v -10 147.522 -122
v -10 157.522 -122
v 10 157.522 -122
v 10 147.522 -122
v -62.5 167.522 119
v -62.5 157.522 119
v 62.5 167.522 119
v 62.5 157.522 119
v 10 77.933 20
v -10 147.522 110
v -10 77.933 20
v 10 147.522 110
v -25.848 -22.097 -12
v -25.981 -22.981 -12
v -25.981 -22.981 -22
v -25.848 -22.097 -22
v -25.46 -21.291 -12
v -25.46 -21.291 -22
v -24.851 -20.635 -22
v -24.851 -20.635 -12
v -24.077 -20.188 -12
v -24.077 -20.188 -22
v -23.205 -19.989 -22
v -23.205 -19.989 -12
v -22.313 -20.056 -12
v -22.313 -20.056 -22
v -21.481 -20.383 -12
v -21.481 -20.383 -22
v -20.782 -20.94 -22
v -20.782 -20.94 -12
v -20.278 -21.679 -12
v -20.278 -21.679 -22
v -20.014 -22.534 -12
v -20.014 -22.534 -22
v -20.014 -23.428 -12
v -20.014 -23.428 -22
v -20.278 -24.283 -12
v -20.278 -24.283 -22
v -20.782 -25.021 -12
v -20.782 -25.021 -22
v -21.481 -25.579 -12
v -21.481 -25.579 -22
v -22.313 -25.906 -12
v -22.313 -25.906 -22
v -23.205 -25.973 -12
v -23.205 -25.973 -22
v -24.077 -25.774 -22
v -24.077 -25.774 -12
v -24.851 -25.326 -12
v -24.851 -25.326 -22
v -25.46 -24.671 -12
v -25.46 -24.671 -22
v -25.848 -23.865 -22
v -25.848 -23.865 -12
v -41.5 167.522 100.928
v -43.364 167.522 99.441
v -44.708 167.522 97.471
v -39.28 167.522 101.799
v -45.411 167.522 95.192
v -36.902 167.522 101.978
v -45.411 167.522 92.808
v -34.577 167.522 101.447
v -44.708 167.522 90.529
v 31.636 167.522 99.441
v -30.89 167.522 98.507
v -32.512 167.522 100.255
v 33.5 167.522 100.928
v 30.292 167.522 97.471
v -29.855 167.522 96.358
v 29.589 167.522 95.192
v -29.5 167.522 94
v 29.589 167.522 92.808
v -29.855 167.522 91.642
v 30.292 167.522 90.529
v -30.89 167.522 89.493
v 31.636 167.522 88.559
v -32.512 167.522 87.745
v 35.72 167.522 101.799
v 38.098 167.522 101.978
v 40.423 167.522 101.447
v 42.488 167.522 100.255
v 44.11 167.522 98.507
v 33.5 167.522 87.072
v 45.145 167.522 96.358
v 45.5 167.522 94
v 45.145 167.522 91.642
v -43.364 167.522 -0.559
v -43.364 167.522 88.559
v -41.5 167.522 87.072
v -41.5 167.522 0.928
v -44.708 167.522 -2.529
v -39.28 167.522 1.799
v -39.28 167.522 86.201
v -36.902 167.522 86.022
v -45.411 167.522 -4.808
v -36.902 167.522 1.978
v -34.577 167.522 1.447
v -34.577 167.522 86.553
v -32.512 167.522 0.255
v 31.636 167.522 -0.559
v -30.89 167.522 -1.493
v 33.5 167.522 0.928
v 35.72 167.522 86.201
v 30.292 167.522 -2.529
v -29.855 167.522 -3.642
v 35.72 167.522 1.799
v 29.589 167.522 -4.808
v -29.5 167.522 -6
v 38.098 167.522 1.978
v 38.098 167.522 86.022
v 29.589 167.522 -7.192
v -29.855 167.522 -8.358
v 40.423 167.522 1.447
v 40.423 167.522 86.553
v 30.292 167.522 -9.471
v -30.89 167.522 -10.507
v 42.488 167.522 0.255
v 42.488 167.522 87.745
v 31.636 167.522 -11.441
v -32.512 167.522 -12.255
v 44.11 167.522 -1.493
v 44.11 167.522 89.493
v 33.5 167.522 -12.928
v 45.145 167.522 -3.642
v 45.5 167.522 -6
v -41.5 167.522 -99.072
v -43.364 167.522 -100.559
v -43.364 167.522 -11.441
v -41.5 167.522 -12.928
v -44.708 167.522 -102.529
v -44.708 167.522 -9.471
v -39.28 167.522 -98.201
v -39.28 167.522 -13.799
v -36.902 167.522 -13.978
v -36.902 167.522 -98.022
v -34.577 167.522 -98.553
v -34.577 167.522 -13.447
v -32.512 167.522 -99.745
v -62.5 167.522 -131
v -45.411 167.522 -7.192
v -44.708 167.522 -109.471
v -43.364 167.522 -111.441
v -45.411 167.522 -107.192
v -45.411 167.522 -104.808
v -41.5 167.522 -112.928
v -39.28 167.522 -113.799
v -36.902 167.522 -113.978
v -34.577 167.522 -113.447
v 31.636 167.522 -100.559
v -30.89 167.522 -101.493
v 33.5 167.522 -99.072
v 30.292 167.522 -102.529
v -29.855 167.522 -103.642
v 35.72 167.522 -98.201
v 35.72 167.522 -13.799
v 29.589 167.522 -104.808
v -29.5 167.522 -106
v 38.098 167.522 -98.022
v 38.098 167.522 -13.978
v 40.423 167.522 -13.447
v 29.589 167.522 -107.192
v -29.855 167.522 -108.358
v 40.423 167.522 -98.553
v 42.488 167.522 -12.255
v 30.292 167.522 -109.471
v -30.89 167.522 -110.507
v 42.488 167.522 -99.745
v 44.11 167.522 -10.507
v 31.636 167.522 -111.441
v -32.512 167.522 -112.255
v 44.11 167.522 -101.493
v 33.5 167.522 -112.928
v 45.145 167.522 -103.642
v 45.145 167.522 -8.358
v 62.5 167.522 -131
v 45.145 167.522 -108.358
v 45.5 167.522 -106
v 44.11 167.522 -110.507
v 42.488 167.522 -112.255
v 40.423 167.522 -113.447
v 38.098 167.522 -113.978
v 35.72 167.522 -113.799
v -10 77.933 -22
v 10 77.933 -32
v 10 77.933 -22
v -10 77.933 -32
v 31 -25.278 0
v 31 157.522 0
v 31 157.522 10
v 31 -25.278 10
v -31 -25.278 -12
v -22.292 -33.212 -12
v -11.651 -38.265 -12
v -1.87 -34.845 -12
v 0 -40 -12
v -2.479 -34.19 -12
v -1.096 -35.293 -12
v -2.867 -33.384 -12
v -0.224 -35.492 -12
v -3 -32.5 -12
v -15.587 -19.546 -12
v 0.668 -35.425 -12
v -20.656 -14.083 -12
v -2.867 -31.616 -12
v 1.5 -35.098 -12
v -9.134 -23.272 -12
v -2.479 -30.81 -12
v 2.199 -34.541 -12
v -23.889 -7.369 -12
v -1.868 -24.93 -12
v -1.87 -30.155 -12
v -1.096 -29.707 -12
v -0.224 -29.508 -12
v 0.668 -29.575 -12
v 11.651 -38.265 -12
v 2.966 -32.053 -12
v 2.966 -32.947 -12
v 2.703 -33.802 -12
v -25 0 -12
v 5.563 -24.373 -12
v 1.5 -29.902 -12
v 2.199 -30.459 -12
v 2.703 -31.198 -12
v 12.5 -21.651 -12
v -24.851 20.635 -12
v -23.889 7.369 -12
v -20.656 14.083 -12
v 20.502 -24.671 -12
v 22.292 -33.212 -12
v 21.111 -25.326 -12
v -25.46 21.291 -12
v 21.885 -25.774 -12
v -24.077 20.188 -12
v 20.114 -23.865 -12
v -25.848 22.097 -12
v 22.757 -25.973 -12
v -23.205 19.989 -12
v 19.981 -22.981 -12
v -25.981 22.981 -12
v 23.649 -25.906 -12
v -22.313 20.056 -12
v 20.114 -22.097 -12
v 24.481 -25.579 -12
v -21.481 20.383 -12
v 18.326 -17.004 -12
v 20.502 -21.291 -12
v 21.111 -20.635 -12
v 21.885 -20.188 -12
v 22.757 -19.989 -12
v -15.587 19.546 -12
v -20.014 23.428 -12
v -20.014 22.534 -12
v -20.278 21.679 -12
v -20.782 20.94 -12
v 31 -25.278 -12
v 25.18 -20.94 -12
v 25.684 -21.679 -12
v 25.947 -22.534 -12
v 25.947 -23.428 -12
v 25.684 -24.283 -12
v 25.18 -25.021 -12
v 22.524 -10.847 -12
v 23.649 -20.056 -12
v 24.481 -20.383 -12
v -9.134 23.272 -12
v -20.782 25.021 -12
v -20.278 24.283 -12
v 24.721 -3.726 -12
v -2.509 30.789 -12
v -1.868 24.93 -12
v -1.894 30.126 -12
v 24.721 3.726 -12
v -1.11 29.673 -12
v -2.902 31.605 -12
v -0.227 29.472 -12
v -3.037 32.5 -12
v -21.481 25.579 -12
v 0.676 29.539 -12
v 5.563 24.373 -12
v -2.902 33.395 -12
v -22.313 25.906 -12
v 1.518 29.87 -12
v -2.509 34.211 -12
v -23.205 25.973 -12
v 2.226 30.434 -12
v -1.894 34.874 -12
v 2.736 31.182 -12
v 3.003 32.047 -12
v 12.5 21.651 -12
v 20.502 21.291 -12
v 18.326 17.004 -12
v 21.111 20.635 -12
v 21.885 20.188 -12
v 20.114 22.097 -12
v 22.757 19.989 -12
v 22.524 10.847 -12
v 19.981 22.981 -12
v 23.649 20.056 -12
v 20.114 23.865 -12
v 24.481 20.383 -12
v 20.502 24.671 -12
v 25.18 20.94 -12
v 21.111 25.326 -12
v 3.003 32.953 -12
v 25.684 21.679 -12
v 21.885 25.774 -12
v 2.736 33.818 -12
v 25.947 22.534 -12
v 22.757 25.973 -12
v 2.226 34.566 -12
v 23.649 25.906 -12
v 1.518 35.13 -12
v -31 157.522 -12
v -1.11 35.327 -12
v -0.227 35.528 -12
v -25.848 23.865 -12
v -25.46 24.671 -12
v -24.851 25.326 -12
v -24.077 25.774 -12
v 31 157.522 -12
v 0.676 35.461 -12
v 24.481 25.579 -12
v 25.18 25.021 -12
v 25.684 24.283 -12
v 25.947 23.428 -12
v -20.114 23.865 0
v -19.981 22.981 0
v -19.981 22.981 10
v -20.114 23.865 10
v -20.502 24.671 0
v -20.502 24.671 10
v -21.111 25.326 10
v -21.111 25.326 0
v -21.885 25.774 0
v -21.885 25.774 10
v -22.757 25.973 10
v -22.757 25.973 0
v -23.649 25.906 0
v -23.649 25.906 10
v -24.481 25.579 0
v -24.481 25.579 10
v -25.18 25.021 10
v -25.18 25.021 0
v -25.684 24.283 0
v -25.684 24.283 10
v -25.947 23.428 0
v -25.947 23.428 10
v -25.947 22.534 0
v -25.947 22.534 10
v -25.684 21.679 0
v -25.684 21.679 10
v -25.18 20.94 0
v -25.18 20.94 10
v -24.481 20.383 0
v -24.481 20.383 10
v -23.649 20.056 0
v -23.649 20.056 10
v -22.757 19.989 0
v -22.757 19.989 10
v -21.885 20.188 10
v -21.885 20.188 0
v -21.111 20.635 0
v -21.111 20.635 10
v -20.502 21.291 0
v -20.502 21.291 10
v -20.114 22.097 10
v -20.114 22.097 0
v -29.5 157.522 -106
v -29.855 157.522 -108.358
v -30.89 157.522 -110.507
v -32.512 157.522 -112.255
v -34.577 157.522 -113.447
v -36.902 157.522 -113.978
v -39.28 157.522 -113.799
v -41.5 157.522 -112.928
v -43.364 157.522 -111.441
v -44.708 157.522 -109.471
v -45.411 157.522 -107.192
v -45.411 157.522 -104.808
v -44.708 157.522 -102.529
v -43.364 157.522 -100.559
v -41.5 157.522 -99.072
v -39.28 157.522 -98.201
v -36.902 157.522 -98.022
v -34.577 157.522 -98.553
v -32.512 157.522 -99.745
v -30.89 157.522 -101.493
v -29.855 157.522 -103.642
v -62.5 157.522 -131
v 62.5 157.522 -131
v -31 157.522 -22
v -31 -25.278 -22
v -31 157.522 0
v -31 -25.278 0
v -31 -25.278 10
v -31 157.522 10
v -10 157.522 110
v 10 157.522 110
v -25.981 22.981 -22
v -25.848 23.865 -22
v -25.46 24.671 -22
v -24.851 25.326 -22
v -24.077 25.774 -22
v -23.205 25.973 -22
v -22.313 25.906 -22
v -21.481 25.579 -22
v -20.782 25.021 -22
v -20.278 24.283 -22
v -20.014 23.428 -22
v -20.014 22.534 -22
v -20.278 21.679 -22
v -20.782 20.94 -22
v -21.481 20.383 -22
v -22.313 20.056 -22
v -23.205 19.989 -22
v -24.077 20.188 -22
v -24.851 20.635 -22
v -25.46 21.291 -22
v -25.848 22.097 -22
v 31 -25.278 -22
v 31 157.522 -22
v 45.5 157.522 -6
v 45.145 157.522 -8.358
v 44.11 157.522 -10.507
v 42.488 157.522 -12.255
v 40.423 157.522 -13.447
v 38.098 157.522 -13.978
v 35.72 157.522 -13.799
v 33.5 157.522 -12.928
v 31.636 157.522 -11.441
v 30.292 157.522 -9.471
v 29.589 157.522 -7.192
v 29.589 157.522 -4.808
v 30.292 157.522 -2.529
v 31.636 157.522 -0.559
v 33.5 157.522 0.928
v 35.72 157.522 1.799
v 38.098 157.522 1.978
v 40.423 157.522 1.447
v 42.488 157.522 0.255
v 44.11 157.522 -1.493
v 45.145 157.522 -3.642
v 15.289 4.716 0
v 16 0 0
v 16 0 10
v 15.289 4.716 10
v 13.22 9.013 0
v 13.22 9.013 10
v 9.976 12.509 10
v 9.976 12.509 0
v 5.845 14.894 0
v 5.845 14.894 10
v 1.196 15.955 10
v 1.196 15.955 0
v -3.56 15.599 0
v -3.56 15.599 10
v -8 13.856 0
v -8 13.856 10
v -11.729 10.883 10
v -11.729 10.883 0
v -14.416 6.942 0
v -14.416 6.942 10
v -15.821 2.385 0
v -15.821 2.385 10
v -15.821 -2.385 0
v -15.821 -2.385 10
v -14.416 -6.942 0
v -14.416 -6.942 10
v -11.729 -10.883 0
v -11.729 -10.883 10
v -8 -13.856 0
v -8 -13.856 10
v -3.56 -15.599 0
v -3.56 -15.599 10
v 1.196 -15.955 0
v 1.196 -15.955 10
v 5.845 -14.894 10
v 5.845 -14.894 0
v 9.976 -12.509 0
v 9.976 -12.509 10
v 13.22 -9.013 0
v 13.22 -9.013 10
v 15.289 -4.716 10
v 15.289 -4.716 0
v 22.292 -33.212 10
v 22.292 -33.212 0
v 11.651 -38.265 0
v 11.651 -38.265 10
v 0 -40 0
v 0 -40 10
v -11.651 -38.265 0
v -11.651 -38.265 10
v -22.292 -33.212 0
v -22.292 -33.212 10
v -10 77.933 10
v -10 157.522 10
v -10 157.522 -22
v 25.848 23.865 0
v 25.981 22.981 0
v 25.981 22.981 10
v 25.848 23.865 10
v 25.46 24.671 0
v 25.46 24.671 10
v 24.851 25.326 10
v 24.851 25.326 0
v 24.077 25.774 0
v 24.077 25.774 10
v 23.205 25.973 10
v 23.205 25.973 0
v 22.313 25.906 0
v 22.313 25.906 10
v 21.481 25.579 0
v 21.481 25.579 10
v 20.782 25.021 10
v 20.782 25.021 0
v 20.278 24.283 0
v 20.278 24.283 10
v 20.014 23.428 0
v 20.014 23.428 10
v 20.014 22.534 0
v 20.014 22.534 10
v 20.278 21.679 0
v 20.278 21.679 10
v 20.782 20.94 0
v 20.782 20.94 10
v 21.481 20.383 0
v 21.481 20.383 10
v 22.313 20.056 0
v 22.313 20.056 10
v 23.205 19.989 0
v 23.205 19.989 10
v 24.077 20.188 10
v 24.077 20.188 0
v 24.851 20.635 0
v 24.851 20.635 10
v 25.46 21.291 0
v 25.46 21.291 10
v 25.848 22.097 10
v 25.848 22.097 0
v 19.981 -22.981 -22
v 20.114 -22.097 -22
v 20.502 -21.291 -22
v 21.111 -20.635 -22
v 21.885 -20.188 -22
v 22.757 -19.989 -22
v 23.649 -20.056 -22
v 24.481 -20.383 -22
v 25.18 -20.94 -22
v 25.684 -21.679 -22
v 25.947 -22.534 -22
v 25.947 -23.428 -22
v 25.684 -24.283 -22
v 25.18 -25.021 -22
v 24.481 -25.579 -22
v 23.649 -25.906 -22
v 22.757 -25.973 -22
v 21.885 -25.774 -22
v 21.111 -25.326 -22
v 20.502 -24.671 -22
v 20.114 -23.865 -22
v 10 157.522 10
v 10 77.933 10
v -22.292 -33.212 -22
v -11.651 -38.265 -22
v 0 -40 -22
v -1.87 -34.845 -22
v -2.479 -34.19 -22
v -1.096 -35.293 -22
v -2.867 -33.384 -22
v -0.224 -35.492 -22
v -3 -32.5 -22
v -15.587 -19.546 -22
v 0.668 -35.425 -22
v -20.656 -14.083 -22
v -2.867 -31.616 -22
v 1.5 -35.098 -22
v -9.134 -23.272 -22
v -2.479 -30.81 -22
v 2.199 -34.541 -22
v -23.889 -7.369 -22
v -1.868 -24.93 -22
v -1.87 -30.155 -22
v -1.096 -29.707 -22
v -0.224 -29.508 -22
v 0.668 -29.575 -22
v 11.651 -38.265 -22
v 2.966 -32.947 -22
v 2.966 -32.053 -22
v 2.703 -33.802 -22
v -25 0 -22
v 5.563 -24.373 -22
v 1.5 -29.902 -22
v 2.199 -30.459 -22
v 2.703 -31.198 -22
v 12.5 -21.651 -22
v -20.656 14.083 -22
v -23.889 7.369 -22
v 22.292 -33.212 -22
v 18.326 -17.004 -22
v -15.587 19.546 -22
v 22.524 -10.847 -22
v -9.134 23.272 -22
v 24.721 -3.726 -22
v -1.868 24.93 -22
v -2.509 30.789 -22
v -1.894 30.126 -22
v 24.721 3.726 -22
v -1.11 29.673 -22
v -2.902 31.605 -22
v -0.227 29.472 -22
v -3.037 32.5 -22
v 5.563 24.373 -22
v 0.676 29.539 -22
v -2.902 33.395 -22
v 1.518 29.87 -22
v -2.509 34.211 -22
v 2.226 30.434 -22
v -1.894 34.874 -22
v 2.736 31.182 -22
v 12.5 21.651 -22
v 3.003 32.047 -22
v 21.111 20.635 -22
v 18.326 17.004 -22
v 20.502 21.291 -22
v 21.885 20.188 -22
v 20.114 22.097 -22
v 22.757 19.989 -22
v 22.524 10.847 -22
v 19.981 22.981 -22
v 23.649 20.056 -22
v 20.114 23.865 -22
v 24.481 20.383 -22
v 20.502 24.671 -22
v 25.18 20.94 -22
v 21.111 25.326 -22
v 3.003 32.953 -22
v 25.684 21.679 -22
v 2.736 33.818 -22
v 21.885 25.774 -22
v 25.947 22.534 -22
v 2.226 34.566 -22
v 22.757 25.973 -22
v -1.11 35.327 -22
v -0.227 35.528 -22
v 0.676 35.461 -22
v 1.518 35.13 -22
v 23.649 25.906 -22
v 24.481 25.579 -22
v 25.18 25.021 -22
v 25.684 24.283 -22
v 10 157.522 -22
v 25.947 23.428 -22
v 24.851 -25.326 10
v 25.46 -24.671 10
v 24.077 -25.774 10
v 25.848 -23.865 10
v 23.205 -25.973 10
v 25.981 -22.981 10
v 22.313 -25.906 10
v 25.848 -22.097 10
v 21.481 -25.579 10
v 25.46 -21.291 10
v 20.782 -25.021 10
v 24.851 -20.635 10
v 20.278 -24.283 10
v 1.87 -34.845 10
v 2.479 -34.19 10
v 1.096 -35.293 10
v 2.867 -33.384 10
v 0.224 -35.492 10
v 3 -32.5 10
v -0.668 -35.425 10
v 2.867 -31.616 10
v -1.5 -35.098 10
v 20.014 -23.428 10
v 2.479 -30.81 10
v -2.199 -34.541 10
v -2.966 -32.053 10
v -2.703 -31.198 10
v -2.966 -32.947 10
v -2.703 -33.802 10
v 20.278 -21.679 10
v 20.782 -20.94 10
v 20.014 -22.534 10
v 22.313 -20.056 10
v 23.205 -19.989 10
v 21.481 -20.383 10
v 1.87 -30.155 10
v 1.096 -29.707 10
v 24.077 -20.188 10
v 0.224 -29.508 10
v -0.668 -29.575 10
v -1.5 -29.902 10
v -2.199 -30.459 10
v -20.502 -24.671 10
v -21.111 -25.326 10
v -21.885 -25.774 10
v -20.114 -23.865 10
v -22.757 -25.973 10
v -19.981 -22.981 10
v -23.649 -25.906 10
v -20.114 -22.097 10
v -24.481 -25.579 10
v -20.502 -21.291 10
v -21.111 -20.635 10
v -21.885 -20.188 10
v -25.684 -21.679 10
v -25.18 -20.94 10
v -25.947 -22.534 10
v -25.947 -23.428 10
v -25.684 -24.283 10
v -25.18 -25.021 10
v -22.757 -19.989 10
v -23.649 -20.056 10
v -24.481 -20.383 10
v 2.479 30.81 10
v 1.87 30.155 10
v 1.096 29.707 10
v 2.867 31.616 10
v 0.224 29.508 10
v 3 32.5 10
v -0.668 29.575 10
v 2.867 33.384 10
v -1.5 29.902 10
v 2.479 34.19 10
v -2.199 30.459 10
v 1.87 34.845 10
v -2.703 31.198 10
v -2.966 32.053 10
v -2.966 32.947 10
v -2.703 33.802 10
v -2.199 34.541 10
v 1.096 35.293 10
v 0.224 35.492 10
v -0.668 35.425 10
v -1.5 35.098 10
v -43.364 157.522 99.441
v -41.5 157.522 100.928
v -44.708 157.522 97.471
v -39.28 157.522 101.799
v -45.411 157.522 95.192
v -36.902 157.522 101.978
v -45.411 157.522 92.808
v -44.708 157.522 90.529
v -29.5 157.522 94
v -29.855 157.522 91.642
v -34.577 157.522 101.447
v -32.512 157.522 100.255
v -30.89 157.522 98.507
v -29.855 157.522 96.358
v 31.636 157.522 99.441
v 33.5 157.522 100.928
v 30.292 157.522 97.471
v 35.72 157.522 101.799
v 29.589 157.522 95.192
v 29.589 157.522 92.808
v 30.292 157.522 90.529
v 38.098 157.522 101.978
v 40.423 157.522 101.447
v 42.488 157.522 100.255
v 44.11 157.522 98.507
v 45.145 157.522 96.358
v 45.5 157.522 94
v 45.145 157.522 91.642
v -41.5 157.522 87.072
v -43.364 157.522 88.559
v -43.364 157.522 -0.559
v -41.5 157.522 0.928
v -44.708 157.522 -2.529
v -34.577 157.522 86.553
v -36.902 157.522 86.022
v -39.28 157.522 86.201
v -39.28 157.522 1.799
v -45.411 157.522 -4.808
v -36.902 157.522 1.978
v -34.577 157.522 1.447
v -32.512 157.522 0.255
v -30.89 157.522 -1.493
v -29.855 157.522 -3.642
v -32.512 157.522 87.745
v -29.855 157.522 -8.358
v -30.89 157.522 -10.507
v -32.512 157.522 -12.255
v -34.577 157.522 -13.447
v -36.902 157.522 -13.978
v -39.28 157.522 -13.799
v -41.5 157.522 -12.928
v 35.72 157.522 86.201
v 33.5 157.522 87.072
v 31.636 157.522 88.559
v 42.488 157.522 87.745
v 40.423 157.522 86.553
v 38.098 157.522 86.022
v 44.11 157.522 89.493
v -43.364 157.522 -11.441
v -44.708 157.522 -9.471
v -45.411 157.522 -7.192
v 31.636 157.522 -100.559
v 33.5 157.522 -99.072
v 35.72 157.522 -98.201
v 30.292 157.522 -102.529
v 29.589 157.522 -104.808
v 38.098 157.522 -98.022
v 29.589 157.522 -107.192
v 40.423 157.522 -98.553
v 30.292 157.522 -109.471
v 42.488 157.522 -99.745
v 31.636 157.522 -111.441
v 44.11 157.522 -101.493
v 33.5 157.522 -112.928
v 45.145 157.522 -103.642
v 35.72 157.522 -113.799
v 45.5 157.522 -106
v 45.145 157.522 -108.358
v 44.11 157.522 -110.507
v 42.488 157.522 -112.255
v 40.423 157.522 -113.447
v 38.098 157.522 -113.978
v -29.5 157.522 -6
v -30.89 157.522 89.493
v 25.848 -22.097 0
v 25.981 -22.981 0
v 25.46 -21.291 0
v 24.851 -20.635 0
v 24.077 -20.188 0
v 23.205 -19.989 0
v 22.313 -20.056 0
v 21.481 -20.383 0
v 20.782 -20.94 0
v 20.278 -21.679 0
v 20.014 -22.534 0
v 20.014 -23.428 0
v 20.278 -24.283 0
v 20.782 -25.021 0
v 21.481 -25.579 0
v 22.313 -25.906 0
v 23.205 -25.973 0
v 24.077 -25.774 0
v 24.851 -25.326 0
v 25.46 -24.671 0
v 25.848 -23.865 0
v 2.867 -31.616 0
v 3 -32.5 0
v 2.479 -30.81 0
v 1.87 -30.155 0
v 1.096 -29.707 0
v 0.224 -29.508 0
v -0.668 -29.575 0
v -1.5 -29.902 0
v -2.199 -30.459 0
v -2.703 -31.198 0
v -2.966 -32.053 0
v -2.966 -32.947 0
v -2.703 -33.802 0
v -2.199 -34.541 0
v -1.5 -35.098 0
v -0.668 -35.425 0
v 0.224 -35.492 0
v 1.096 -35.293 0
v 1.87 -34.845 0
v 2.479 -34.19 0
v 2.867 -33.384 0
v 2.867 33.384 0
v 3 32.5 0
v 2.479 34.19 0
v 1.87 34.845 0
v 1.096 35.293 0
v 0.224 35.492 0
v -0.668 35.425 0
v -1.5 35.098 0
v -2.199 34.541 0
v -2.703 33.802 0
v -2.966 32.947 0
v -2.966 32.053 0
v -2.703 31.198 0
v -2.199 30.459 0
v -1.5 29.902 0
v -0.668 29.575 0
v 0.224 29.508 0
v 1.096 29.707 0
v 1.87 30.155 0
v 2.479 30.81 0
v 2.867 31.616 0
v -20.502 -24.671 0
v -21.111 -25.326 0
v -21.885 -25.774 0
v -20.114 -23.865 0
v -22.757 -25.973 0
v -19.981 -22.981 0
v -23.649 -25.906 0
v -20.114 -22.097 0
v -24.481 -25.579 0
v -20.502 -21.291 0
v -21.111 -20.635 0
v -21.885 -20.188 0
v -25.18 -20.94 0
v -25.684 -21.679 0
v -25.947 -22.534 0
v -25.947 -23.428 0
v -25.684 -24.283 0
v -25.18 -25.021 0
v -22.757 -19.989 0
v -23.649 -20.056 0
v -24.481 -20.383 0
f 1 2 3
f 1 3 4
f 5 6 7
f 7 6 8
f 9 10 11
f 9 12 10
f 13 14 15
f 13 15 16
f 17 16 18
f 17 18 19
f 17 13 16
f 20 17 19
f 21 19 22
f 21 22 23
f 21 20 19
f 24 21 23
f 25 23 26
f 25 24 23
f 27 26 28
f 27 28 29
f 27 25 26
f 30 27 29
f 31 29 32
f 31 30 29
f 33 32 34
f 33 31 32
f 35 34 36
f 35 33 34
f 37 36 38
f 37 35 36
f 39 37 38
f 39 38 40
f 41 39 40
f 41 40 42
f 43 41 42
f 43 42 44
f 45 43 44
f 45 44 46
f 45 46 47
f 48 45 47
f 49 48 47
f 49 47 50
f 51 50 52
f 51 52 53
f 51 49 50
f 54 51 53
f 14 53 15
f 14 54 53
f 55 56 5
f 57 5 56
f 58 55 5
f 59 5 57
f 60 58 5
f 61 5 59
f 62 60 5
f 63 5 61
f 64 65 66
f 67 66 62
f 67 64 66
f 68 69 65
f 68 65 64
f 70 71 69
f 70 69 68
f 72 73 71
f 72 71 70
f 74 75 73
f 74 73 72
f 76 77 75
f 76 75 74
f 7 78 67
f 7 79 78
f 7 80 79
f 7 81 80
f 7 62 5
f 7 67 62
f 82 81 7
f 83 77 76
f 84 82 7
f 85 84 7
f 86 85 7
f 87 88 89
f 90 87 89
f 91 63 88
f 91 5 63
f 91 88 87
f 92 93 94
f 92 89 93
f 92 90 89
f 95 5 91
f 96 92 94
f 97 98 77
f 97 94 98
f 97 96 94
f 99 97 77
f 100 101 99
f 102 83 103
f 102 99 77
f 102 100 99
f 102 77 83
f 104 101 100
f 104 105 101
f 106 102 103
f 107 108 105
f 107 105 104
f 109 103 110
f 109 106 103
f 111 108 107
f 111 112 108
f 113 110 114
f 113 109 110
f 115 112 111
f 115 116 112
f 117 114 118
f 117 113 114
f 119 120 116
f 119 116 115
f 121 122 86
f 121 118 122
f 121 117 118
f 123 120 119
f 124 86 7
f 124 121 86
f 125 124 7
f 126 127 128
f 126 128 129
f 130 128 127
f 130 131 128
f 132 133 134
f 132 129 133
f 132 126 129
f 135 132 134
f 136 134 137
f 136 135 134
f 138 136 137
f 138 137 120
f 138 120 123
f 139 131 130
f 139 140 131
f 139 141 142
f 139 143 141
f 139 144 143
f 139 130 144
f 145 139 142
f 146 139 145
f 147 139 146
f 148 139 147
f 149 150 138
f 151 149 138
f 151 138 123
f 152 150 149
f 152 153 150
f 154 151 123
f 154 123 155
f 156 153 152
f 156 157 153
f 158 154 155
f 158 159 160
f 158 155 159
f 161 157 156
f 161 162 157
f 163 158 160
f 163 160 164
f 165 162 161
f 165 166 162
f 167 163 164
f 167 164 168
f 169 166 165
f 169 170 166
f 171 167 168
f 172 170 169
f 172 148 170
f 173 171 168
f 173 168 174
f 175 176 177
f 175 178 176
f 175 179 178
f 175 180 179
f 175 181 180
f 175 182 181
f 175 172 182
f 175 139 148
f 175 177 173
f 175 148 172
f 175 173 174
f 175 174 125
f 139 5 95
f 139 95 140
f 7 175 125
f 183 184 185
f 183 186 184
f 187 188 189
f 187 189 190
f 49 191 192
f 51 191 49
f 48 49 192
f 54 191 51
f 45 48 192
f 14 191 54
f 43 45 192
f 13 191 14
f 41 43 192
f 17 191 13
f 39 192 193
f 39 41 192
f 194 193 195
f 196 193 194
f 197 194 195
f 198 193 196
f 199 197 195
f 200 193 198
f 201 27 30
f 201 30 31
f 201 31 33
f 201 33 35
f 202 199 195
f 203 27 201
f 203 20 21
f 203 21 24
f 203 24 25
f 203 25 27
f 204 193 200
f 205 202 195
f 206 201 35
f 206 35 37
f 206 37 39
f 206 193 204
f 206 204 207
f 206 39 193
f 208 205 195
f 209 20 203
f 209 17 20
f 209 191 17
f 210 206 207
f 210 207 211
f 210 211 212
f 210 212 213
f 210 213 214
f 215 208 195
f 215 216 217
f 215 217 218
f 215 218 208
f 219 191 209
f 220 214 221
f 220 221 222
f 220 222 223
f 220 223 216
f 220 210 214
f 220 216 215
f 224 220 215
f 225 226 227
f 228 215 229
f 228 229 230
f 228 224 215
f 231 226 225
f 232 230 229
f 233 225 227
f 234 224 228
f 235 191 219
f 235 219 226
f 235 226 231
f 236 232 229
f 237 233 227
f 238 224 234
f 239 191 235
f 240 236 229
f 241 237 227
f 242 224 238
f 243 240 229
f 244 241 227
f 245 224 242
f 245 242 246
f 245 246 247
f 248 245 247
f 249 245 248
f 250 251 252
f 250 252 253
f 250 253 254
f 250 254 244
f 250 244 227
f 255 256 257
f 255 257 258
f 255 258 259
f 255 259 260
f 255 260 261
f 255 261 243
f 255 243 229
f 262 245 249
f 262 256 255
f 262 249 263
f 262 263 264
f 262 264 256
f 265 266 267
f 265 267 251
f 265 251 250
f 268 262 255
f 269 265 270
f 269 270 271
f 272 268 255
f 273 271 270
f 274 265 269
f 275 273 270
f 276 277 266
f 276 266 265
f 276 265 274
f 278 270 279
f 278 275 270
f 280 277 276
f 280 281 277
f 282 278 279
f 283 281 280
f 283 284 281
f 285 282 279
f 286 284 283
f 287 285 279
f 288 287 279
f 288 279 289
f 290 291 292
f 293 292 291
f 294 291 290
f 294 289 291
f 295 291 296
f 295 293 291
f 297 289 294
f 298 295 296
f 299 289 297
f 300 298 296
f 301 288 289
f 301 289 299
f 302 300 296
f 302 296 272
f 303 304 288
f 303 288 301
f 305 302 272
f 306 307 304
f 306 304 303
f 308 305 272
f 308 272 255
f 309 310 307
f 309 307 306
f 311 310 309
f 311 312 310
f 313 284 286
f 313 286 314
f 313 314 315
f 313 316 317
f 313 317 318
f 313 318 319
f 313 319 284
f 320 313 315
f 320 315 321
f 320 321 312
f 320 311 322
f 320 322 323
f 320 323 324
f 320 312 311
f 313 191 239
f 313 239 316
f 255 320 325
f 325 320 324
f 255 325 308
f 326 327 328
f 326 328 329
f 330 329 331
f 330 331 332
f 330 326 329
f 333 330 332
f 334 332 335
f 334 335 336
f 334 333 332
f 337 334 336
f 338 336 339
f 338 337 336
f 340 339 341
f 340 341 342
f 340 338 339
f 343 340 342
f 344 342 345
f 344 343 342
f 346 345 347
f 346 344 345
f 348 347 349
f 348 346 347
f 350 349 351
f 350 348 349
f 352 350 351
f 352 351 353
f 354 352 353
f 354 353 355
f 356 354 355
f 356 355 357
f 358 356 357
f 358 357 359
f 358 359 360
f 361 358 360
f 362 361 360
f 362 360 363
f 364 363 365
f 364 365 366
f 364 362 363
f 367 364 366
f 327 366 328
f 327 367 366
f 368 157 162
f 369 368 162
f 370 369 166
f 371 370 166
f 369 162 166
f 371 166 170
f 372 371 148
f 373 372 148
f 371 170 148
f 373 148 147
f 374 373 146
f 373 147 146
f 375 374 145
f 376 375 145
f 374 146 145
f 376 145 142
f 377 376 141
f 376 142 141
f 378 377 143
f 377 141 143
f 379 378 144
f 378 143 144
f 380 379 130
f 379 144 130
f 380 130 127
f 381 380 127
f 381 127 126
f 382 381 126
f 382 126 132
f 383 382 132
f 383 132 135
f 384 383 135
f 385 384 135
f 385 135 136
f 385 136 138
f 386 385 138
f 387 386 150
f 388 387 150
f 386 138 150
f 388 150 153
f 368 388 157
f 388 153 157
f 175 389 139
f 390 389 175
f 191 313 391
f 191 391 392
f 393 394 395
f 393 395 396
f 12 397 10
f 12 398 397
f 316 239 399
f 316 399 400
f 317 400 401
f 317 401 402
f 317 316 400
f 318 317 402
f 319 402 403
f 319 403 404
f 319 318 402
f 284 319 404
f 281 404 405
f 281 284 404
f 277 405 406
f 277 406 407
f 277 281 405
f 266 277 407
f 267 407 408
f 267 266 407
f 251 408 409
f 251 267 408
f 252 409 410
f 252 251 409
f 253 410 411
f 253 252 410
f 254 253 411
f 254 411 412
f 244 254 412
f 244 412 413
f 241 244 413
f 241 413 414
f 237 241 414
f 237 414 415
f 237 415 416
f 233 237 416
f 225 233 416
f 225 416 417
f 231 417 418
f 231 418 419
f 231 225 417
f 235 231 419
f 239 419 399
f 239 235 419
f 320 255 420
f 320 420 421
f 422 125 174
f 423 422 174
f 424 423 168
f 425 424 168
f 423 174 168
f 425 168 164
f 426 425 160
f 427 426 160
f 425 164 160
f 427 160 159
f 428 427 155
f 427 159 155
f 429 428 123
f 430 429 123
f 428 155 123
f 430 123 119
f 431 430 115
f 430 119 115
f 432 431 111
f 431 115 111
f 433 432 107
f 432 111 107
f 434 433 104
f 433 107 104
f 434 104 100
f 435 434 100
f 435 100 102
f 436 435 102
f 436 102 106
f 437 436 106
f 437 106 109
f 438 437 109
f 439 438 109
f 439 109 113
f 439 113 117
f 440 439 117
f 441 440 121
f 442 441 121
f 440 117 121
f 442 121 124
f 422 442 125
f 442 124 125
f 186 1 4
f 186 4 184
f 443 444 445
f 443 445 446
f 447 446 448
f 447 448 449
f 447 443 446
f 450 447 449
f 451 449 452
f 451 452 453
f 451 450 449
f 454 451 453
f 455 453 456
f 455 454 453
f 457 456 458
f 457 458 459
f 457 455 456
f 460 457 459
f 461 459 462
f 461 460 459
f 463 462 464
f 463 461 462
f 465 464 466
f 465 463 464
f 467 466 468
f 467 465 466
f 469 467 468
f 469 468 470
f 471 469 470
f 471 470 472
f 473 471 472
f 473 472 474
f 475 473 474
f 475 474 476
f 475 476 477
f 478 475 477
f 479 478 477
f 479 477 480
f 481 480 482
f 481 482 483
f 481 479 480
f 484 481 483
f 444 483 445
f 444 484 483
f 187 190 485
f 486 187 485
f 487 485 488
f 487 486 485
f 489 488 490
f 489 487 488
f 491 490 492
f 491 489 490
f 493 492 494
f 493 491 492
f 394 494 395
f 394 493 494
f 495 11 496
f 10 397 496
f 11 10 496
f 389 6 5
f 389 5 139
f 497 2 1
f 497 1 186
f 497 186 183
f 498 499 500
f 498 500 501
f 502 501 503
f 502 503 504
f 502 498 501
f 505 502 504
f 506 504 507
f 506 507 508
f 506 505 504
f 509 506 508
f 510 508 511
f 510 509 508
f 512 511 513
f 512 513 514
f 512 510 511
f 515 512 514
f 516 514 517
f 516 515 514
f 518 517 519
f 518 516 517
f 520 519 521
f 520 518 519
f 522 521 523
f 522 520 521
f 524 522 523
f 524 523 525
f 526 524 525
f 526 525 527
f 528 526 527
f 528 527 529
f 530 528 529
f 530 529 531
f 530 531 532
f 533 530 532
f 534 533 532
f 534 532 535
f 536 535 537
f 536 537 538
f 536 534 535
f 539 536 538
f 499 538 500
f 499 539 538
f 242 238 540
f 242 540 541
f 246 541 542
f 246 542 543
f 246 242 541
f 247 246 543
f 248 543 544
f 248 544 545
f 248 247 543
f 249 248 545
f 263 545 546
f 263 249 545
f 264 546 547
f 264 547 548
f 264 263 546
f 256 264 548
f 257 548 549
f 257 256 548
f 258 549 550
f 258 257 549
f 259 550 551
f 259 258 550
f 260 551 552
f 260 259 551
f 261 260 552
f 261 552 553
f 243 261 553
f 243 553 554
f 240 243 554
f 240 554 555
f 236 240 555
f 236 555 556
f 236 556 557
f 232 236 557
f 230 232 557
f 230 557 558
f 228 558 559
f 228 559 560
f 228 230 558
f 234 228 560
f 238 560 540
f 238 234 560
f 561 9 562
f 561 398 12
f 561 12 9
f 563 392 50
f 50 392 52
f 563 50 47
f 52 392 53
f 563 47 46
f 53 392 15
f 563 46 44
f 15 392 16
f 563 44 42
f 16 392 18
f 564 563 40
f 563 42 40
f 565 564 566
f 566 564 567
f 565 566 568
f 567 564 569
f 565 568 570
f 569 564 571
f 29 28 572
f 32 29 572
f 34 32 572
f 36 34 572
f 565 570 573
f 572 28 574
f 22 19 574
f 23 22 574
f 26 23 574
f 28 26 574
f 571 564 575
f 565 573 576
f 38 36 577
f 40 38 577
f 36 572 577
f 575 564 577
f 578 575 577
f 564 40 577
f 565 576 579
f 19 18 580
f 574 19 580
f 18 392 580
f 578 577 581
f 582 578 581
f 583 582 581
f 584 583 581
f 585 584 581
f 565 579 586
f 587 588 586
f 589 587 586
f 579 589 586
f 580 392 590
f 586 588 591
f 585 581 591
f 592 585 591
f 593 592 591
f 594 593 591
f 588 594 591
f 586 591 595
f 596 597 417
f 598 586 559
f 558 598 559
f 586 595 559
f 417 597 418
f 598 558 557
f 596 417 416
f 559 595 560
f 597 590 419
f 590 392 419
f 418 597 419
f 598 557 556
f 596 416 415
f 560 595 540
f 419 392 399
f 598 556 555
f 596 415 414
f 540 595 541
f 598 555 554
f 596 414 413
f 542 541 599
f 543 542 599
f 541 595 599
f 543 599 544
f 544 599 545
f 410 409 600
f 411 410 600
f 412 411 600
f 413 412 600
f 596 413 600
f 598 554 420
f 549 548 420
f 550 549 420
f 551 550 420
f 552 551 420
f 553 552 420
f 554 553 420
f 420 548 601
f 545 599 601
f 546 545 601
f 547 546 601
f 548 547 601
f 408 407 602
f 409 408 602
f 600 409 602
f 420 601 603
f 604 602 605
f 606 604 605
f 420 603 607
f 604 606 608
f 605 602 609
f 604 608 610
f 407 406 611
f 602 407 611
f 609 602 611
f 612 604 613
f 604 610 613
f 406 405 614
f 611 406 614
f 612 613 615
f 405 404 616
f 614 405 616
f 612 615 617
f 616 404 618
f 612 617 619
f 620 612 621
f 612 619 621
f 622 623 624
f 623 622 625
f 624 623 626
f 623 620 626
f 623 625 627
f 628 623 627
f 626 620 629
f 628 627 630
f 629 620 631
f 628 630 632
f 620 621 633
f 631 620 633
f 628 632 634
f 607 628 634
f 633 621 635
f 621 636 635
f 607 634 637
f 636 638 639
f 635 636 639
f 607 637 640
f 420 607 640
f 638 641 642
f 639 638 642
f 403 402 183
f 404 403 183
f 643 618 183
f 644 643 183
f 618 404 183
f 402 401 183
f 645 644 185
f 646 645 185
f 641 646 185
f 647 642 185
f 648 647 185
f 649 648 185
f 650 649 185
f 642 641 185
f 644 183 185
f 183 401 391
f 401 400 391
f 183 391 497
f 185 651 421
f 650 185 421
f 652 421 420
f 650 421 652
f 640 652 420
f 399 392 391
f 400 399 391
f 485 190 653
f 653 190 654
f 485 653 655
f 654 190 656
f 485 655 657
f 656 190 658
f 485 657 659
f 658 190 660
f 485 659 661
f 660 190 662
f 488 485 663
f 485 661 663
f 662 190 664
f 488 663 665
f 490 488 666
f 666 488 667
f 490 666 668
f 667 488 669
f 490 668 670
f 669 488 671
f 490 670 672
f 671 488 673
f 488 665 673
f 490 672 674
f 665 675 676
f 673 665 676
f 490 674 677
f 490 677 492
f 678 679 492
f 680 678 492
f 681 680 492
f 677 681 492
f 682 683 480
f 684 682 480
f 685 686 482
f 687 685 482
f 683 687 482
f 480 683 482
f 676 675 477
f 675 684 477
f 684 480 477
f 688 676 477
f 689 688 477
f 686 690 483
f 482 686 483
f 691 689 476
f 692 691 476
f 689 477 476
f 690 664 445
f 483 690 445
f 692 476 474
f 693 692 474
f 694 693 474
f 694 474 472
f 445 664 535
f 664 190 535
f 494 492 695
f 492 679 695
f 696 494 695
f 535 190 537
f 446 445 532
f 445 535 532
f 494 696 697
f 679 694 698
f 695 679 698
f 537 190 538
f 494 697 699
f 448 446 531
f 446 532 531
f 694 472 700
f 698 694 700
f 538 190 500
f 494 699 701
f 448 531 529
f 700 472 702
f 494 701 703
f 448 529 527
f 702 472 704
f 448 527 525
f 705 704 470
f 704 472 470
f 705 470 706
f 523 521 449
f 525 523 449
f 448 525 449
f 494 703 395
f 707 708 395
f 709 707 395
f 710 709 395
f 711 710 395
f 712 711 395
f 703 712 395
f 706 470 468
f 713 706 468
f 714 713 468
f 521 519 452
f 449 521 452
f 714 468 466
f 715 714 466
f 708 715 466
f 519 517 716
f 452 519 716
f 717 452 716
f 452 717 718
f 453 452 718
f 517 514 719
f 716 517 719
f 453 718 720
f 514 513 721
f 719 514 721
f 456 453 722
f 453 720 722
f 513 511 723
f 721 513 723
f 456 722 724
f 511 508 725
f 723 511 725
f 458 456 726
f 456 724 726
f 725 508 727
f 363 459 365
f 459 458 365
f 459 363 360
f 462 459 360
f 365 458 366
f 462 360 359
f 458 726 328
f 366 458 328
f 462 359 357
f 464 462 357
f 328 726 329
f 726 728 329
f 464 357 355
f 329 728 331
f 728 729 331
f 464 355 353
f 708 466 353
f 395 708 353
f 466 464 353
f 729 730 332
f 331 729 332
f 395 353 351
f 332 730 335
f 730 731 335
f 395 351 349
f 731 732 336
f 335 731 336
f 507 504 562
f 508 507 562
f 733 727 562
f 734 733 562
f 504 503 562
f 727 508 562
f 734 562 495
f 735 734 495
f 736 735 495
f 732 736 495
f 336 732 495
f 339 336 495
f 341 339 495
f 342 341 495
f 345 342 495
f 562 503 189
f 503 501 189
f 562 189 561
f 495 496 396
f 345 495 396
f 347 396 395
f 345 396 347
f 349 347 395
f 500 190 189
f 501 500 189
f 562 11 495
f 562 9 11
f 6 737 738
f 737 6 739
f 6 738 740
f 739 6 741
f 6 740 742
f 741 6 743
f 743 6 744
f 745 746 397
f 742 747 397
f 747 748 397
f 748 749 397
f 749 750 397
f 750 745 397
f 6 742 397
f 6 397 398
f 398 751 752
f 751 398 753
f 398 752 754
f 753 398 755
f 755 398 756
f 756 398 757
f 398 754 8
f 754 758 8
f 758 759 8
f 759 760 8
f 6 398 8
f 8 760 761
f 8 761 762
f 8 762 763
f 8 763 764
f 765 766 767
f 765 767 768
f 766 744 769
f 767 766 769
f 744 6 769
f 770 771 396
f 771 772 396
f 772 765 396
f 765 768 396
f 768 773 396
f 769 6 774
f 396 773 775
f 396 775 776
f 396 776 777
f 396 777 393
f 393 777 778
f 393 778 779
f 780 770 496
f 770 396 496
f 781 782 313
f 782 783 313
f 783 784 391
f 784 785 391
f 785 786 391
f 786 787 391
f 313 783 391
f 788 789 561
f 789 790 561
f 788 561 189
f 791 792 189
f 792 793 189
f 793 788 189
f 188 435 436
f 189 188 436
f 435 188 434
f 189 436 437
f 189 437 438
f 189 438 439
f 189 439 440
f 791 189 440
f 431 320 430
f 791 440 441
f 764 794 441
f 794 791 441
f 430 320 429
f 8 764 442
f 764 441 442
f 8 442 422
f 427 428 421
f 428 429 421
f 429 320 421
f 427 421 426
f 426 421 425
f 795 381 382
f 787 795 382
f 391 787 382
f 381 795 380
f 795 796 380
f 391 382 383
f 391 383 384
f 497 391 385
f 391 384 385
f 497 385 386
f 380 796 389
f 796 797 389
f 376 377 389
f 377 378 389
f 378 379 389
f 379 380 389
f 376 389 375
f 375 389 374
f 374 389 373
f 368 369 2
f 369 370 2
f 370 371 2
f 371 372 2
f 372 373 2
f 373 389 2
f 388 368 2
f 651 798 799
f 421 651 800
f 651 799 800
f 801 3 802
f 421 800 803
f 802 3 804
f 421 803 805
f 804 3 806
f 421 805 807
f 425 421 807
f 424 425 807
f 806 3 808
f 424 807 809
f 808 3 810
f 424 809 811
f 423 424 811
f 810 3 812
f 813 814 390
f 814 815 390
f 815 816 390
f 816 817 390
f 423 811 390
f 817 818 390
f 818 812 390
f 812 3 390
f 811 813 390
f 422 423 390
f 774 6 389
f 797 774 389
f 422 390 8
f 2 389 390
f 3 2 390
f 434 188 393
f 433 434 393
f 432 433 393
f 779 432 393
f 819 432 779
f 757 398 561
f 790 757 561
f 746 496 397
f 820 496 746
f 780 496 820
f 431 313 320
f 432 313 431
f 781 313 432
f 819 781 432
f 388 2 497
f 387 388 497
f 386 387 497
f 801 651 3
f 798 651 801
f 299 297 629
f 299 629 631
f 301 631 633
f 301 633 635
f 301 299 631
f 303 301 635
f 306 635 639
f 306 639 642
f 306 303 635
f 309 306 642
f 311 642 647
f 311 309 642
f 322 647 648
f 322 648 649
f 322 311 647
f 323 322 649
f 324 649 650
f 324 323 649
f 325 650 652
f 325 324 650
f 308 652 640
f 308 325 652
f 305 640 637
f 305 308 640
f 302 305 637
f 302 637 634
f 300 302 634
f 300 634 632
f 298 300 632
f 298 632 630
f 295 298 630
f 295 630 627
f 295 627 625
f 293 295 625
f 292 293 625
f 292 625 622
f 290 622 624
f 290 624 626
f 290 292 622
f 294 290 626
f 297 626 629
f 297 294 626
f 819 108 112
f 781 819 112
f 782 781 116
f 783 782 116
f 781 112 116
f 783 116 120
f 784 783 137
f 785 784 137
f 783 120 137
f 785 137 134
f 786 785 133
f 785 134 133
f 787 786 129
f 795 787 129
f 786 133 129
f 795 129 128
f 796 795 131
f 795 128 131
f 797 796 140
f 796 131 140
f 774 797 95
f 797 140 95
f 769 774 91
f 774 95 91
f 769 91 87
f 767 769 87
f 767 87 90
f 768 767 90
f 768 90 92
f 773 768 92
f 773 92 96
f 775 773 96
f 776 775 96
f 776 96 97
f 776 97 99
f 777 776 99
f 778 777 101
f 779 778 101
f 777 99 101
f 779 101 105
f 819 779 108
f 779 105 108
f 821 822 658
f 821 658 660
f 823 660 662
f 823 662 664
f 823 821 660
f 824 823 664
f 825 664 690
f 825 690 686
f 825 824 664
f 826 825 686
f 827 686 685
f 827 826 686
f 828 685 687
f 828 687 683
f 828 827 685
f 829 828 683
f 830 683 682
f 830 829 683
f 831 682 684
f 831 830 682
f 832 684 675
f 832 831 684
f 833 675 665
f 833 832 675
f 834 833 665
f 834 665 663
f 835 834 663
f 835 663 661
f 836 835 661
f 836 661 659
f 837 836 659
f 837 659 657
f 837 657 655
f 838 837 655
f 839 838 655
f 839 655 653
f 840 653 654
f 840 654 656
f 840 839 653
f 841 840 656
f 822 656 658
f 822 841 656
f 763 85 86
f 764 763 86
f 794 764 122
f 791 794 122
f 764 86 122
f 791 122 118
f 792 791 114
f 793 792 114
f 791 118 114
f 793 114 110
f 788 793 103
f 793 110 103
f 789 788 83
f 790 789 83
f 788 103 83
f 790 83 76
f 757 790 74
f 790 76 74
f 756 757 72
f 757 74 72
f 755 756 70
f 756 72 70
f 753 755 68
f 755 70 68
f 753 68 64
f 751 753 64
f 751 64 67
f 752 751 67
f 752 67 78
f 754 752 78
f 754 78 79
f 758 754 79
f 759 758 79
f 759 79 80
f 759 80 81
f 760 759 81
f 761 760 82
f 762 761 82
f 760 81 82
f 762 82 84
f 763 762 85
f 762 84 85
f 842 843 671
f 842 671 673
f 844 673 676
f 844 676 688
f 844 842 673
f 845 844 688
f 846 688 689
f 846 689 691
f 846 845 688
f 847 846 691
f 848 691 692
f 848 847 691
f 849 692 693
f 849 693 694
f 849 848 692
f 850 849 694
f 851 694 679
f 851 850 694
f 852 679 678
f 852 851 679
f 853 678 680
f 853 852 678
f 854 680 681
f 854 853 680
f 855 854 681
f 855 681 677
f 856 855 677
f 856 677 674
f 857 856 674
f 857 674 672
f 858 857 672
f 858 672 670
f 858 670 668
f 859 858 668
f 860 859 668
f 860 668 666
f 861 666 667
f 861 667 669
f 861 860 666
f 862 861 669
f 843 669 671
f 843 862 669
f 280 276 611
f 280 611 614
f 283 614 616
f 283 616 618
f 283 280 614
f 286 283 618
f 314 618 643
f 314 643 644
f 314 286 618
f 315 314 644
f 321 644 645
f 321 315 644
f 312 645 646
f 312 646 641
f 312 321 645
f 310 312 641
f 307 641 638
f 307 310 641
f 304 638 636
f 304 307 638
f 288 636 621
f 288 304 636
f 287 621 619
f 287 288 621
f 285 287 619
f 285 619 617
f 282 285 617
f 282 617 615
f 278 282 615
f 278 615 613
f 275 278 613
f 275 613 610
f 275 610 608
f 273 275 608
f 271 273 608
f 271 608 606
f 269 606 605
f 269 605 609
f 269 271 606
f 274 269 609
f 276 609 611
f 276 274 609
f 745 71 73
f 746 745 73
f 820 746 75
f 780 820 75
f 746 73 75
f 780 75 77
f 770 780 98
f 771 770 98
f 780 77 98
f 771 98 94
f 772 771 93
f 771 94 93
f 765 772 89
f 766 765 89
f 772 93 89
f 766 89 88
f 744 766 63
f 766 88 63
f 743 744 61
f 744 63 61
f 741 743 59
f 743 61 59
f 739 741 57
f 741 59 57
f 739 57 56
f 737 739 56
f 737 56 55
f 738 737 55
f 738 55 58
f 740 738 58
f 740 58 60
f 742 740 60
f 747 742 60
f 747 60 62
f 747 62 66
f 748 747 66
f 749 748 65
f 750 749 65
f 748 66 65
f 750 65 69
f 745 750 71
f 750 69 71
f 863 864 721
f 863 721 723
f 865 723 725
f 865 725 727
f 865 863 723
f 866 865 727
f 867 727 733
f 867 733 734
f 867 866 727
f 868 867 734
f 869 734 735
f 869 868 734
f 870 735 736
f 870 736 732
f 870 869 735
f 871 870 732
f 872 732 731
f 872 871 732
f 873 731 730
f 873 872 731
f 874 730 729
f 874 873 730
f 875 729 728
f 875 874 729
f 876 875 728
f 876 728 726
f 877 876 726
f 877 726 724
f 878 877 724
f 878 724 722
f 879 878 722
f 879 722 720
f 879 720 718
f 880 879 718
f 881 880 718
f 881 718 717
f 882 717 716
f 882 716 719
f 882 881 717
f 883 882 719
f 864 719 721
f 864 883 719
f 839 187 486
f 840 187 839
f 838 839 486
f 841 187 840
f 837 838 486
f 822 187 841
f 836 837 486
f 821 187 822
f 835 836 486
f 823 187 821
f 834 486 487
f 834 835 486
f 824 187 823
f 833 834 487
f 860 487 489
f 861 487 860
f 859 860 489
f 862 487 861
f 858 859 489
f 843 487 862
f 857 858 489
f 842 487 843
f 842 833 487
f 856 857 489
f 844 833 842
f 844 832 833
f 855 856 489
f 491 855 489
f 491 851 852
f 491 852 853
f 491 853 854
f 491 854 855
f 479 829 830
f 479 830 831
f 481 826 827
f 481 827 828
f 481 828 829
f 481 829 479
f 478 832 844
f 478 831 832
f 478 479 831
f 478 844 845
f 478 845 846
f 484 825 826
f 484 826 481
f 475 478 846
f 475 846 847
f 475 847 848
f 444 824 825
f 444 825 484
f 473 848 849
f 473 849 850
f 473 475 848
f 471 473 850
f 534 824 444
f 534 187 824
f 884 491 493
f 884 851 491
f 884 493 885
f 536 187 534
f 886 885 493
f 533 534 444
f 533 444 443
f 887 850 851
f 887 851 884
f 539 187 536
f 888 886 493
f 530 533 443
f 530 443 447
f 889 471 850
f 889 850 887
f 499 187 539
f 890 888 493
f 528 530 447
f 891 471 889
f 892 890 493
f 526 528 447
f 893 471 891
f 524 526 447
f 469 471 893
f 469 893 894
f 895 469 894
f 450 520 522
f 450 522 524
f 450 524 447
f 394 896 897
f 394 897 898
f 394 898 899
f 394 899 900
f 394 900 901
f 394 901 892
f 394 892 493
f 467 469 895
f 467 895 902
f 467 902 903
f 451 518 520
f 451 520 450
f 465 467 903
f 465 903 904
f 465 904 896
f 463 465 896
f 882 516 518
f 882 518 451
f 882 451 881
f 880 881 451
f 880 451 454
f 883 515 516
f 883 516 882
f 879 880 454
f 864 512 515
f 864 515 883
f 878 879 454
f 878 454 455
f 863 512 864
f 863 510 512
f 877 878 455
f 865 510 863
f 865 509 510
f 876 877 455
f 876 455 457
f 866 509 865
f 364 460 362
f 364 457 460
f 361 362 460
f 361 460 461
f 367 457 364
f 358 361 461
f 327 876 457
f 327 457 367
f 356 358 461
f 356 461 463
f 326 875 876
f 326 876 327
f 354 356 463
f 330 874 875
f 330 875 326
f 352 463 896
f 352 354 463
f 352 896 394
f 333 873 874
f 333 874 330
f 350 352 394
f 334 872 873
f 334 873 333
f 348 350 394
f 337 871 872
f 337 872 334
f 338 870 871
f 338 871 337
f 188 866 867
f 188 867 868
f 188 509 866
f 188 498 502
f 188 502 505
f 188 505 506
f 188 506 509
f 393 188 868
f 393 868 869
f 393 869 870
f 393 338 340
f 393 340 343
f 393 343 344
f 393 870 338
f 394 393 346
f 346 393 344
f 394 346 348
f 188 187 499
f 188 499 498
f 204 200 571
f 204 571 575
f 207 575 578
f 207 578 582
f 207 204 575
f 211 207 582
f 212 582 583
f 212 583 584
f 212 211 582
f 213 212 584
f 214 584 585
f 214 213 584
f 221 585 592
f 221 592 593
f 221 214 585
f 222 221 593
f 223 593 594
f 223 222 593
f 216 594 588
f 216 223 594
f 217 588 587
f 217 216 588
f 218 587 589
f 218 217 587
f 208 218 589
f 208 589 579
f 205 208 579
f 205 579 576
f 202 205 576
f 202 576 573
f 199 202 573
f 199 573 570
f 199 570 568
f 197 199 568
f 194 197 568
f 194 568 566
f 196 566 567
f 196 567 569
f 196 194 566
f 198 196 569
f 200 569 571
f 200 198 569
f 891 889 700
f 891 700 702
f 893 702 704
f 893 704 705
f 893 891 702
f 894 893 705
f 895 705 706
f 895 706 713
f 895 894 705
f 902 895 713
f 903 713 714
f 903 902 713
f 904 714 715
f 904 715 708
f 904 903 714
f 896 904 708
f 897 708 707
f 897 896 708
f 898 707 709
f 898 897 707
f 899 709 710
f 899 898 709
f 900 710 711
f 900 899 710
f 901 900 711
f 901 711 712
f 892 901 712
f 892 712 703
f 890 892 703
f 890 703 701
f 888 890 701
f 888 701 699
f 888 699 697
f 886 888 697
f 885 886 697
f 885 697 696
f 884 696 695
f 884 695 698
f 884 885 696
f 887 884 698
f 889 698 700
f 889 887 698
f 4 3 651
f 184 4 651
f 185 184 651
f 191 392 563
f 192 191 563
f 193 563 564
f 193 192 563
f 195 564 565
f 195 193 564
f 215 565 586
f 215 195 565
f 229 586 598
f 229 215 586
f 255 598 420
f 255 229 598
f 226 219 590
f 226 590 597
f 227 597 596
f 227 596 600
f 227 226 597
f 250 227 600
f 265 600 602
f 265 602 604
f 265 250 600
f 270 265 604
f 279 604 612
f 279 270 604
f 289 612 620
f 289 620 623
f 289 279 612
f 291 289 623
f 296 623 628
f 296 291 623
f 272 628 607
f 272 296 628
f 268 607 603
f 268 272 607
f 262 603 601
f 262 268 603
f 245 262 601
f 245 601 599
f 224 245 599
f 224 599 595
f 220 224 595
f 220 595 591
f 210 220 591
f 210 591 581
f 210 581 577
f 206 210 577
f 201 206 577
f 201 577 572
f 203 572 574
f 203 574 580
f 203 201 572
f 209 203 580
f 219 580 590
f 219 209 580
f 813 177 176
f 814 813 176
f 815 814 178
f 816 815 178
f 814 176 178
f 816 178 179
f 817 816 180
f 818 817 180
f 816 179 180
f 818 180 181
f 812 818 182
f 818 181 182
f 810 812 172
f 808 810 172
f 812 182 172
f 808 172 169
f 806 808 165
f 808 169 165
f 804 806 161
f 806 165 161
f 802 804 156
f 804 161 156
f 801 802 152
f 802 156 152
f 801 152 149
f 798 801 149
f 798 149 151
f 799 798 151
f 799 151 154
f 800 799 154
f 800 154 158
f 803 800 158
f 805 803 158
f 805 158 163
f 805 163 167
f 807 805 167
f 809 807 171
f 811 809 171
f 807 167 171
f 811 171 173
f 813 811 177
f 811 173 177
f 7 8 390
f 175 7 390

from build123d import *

# Parameters (mm, degrees)
SKETCH1_R           = 3
SKETCH1_R_2         = 16
BOSS_EXTRUDE1_DEPTH = 10
SKETCH2_R           = 3.036946437
SKETCH2_R_2         = 3
SKETCH2_R_3         = 25
BOSS_EXTRUDE2_DEPTH = 10
SKETCH3_W           = 125
SKETCH3_H           = 250
BOSS_EXTRUDE3_DEPTH = 10
BOSS_EXTRUDE4_DEPTH = 10
SKETCH6_R           = 8
CUT_EXTRUDE1_DEPTH  = 10


with BuildPart() as part:
    # Sketch1 → Boss-Extrude1 (new body)
    with BuildSketch(Plane.XY):
        with BuildLine():
            Line((-31, -25.27844932), (-31, 157.52155068))
            Line((-31, 157.52155068), (31, 157.52155068))
            Line((31, 157.52155068), (31, -25.27844932))
            ThreePointArc((31, -25.27844932), (0, -40), (-31, -25.27844932))
        make_face()
        with Locations((0, 32.5)):
            Circle(SKETCH1_R, mode=Mode.SUBTRACT)
        with Locations((-22.980970389, 22.980970389)):
            Circle(SKETCH1_R, mode=Mode.SUBTRACT)
        with Locations((22.980970389, 22.980970389)):
            Circle(SKETCH1_R, mode=Mode.SUBTRACT)
        with Locations((22.980970389, -22.980970389)):
            Circle(SKETCH1_R, mode=Mode.SUBTRACT)
        with Locations((0, -32.5)):
            Circle(SKETCH1_R, mode=Mode.SUBTRACT)
        with Locations((-22.980970389, -22.980970389)):
            Circle(SKETCH1_R, mode=Mode.SUBTRACT)
        Circle(SKETCH1_R_2, mode=Mode.SUBTRACT)
    extrude(amount=BOSS_EXTRUDE1_DEPTH)



with BuildPart() as body_2:
    # Sketch2 → Boss-Extrude2 (new body)
    with BuildSketch(Plane(origin=(0, 0, -12), x_dir=(-1, 0, 0), z_dir=(0, 0, -1))):
        with BuildLine():
            Line((-31, 157.52155068), (31, 157.52155068))
            Line((31, 157.52155068), (31, -25.27844932))
            ThreePointArc((31, -25.27844932), (0, -40), (-31, -25.27844932))
            Line((-31, -25.27844932), (-31, 157.52155068))
        make_face()
        with Locations((0, 32.5)):
            Circle(SKETCH2_R, mode=Mode.SUBTRACT)
        with Locations((22.980970389, 22.980970389)):
            Circle(SKETCH2_R_2, mode=Mode.SUBTRACT)
        with Locations((-22.980970389, 22.980970389)):
            Circle(SKETCH2_R_2, mode=Mode.SUBTRACT)
        with Locations((22.980970389, -22.980970389)):
            Circle(SKETCH2_R_2, mode=Mode.SUBTRACT)
        with Locations((0, -32.5)):
            Circle(SKETCH2_R_2, mode=Mode.SUBTRACT)
        with Locations((-22.980970389, -22.980970389)):
            Circle(SKETCH2_R_2, mode=Mode.SUBTRACT)
        Circle(SKETCH2_R_3, mode=Mode.SUBTRACT)
    extrude(amount=BOSS_EXTRUDE2_DEPTH)


with BuildPart() as part_1:
    add(part.part)

    add(body_2.part)  # Boss-Extrude3 merges body 2
    # Sketch3 → Boss-Extrude3 (add)
    with BuildSketch(Plane(origin=(0, 157.52155068, 0), x_dir=(1, 0, 0), z_dir=(0, 1, 0))):
        with Locations((0, 6)):
            Rectangle(SKETCH3_W, SKETCH3_H)
    extrude(amount=BOSS_EXTRUDE3_DEPTH)

    # Sketch5 → Boss-Extrude4 (add, symmetric)
    with BuildSketch(Plane(origin=(0, 0, 0), x_dir=(0, 0, -1), z_dir=(1, 0, 0))):
        Polygon((22, 157.52155068), (122, 157.52155068), (122, 147.52155068), (32, 77.933321793), (22, 77.933321793), align=None)
        Polygon((-20, 77.933321793), (-10, 77.933321793), (-10, 157.52155068), (-110, 157.52155068), (-110, 147.52155068), align=None)
    extrude(amount=BOSS_EXTRUDE4_DEPTH, both=True)

    # Sketch6 → Cut-Extrude1 (cut)
    with BuildSketch(Plane(origin=(0, 167.52155068, 0), x_dir=(1, 0, 0), z_dir=(0, 1, 0))):
        with Locations((-37.5, 106)):
            Circle(SKETCH6_R)
        with Locations((37.5, 106)):
            Circle(SKETCH6_R)
        with Locations((37.5, 6)):
            Circle(SKETCH6_R)
        with Locations((37.5, -94)):
            Circle(SKETCH6_R)
        with Locations((-37.5, -94)):
            Circle(SKETCH6_R)
        with Locations((-37.5, 6)):
            Circle(SKETCH6_R)
    extrude(amount=-CUT_EXTRUDE1_DEPTH, mode=Mode.SUBTRACT)


solid = part_1.part
